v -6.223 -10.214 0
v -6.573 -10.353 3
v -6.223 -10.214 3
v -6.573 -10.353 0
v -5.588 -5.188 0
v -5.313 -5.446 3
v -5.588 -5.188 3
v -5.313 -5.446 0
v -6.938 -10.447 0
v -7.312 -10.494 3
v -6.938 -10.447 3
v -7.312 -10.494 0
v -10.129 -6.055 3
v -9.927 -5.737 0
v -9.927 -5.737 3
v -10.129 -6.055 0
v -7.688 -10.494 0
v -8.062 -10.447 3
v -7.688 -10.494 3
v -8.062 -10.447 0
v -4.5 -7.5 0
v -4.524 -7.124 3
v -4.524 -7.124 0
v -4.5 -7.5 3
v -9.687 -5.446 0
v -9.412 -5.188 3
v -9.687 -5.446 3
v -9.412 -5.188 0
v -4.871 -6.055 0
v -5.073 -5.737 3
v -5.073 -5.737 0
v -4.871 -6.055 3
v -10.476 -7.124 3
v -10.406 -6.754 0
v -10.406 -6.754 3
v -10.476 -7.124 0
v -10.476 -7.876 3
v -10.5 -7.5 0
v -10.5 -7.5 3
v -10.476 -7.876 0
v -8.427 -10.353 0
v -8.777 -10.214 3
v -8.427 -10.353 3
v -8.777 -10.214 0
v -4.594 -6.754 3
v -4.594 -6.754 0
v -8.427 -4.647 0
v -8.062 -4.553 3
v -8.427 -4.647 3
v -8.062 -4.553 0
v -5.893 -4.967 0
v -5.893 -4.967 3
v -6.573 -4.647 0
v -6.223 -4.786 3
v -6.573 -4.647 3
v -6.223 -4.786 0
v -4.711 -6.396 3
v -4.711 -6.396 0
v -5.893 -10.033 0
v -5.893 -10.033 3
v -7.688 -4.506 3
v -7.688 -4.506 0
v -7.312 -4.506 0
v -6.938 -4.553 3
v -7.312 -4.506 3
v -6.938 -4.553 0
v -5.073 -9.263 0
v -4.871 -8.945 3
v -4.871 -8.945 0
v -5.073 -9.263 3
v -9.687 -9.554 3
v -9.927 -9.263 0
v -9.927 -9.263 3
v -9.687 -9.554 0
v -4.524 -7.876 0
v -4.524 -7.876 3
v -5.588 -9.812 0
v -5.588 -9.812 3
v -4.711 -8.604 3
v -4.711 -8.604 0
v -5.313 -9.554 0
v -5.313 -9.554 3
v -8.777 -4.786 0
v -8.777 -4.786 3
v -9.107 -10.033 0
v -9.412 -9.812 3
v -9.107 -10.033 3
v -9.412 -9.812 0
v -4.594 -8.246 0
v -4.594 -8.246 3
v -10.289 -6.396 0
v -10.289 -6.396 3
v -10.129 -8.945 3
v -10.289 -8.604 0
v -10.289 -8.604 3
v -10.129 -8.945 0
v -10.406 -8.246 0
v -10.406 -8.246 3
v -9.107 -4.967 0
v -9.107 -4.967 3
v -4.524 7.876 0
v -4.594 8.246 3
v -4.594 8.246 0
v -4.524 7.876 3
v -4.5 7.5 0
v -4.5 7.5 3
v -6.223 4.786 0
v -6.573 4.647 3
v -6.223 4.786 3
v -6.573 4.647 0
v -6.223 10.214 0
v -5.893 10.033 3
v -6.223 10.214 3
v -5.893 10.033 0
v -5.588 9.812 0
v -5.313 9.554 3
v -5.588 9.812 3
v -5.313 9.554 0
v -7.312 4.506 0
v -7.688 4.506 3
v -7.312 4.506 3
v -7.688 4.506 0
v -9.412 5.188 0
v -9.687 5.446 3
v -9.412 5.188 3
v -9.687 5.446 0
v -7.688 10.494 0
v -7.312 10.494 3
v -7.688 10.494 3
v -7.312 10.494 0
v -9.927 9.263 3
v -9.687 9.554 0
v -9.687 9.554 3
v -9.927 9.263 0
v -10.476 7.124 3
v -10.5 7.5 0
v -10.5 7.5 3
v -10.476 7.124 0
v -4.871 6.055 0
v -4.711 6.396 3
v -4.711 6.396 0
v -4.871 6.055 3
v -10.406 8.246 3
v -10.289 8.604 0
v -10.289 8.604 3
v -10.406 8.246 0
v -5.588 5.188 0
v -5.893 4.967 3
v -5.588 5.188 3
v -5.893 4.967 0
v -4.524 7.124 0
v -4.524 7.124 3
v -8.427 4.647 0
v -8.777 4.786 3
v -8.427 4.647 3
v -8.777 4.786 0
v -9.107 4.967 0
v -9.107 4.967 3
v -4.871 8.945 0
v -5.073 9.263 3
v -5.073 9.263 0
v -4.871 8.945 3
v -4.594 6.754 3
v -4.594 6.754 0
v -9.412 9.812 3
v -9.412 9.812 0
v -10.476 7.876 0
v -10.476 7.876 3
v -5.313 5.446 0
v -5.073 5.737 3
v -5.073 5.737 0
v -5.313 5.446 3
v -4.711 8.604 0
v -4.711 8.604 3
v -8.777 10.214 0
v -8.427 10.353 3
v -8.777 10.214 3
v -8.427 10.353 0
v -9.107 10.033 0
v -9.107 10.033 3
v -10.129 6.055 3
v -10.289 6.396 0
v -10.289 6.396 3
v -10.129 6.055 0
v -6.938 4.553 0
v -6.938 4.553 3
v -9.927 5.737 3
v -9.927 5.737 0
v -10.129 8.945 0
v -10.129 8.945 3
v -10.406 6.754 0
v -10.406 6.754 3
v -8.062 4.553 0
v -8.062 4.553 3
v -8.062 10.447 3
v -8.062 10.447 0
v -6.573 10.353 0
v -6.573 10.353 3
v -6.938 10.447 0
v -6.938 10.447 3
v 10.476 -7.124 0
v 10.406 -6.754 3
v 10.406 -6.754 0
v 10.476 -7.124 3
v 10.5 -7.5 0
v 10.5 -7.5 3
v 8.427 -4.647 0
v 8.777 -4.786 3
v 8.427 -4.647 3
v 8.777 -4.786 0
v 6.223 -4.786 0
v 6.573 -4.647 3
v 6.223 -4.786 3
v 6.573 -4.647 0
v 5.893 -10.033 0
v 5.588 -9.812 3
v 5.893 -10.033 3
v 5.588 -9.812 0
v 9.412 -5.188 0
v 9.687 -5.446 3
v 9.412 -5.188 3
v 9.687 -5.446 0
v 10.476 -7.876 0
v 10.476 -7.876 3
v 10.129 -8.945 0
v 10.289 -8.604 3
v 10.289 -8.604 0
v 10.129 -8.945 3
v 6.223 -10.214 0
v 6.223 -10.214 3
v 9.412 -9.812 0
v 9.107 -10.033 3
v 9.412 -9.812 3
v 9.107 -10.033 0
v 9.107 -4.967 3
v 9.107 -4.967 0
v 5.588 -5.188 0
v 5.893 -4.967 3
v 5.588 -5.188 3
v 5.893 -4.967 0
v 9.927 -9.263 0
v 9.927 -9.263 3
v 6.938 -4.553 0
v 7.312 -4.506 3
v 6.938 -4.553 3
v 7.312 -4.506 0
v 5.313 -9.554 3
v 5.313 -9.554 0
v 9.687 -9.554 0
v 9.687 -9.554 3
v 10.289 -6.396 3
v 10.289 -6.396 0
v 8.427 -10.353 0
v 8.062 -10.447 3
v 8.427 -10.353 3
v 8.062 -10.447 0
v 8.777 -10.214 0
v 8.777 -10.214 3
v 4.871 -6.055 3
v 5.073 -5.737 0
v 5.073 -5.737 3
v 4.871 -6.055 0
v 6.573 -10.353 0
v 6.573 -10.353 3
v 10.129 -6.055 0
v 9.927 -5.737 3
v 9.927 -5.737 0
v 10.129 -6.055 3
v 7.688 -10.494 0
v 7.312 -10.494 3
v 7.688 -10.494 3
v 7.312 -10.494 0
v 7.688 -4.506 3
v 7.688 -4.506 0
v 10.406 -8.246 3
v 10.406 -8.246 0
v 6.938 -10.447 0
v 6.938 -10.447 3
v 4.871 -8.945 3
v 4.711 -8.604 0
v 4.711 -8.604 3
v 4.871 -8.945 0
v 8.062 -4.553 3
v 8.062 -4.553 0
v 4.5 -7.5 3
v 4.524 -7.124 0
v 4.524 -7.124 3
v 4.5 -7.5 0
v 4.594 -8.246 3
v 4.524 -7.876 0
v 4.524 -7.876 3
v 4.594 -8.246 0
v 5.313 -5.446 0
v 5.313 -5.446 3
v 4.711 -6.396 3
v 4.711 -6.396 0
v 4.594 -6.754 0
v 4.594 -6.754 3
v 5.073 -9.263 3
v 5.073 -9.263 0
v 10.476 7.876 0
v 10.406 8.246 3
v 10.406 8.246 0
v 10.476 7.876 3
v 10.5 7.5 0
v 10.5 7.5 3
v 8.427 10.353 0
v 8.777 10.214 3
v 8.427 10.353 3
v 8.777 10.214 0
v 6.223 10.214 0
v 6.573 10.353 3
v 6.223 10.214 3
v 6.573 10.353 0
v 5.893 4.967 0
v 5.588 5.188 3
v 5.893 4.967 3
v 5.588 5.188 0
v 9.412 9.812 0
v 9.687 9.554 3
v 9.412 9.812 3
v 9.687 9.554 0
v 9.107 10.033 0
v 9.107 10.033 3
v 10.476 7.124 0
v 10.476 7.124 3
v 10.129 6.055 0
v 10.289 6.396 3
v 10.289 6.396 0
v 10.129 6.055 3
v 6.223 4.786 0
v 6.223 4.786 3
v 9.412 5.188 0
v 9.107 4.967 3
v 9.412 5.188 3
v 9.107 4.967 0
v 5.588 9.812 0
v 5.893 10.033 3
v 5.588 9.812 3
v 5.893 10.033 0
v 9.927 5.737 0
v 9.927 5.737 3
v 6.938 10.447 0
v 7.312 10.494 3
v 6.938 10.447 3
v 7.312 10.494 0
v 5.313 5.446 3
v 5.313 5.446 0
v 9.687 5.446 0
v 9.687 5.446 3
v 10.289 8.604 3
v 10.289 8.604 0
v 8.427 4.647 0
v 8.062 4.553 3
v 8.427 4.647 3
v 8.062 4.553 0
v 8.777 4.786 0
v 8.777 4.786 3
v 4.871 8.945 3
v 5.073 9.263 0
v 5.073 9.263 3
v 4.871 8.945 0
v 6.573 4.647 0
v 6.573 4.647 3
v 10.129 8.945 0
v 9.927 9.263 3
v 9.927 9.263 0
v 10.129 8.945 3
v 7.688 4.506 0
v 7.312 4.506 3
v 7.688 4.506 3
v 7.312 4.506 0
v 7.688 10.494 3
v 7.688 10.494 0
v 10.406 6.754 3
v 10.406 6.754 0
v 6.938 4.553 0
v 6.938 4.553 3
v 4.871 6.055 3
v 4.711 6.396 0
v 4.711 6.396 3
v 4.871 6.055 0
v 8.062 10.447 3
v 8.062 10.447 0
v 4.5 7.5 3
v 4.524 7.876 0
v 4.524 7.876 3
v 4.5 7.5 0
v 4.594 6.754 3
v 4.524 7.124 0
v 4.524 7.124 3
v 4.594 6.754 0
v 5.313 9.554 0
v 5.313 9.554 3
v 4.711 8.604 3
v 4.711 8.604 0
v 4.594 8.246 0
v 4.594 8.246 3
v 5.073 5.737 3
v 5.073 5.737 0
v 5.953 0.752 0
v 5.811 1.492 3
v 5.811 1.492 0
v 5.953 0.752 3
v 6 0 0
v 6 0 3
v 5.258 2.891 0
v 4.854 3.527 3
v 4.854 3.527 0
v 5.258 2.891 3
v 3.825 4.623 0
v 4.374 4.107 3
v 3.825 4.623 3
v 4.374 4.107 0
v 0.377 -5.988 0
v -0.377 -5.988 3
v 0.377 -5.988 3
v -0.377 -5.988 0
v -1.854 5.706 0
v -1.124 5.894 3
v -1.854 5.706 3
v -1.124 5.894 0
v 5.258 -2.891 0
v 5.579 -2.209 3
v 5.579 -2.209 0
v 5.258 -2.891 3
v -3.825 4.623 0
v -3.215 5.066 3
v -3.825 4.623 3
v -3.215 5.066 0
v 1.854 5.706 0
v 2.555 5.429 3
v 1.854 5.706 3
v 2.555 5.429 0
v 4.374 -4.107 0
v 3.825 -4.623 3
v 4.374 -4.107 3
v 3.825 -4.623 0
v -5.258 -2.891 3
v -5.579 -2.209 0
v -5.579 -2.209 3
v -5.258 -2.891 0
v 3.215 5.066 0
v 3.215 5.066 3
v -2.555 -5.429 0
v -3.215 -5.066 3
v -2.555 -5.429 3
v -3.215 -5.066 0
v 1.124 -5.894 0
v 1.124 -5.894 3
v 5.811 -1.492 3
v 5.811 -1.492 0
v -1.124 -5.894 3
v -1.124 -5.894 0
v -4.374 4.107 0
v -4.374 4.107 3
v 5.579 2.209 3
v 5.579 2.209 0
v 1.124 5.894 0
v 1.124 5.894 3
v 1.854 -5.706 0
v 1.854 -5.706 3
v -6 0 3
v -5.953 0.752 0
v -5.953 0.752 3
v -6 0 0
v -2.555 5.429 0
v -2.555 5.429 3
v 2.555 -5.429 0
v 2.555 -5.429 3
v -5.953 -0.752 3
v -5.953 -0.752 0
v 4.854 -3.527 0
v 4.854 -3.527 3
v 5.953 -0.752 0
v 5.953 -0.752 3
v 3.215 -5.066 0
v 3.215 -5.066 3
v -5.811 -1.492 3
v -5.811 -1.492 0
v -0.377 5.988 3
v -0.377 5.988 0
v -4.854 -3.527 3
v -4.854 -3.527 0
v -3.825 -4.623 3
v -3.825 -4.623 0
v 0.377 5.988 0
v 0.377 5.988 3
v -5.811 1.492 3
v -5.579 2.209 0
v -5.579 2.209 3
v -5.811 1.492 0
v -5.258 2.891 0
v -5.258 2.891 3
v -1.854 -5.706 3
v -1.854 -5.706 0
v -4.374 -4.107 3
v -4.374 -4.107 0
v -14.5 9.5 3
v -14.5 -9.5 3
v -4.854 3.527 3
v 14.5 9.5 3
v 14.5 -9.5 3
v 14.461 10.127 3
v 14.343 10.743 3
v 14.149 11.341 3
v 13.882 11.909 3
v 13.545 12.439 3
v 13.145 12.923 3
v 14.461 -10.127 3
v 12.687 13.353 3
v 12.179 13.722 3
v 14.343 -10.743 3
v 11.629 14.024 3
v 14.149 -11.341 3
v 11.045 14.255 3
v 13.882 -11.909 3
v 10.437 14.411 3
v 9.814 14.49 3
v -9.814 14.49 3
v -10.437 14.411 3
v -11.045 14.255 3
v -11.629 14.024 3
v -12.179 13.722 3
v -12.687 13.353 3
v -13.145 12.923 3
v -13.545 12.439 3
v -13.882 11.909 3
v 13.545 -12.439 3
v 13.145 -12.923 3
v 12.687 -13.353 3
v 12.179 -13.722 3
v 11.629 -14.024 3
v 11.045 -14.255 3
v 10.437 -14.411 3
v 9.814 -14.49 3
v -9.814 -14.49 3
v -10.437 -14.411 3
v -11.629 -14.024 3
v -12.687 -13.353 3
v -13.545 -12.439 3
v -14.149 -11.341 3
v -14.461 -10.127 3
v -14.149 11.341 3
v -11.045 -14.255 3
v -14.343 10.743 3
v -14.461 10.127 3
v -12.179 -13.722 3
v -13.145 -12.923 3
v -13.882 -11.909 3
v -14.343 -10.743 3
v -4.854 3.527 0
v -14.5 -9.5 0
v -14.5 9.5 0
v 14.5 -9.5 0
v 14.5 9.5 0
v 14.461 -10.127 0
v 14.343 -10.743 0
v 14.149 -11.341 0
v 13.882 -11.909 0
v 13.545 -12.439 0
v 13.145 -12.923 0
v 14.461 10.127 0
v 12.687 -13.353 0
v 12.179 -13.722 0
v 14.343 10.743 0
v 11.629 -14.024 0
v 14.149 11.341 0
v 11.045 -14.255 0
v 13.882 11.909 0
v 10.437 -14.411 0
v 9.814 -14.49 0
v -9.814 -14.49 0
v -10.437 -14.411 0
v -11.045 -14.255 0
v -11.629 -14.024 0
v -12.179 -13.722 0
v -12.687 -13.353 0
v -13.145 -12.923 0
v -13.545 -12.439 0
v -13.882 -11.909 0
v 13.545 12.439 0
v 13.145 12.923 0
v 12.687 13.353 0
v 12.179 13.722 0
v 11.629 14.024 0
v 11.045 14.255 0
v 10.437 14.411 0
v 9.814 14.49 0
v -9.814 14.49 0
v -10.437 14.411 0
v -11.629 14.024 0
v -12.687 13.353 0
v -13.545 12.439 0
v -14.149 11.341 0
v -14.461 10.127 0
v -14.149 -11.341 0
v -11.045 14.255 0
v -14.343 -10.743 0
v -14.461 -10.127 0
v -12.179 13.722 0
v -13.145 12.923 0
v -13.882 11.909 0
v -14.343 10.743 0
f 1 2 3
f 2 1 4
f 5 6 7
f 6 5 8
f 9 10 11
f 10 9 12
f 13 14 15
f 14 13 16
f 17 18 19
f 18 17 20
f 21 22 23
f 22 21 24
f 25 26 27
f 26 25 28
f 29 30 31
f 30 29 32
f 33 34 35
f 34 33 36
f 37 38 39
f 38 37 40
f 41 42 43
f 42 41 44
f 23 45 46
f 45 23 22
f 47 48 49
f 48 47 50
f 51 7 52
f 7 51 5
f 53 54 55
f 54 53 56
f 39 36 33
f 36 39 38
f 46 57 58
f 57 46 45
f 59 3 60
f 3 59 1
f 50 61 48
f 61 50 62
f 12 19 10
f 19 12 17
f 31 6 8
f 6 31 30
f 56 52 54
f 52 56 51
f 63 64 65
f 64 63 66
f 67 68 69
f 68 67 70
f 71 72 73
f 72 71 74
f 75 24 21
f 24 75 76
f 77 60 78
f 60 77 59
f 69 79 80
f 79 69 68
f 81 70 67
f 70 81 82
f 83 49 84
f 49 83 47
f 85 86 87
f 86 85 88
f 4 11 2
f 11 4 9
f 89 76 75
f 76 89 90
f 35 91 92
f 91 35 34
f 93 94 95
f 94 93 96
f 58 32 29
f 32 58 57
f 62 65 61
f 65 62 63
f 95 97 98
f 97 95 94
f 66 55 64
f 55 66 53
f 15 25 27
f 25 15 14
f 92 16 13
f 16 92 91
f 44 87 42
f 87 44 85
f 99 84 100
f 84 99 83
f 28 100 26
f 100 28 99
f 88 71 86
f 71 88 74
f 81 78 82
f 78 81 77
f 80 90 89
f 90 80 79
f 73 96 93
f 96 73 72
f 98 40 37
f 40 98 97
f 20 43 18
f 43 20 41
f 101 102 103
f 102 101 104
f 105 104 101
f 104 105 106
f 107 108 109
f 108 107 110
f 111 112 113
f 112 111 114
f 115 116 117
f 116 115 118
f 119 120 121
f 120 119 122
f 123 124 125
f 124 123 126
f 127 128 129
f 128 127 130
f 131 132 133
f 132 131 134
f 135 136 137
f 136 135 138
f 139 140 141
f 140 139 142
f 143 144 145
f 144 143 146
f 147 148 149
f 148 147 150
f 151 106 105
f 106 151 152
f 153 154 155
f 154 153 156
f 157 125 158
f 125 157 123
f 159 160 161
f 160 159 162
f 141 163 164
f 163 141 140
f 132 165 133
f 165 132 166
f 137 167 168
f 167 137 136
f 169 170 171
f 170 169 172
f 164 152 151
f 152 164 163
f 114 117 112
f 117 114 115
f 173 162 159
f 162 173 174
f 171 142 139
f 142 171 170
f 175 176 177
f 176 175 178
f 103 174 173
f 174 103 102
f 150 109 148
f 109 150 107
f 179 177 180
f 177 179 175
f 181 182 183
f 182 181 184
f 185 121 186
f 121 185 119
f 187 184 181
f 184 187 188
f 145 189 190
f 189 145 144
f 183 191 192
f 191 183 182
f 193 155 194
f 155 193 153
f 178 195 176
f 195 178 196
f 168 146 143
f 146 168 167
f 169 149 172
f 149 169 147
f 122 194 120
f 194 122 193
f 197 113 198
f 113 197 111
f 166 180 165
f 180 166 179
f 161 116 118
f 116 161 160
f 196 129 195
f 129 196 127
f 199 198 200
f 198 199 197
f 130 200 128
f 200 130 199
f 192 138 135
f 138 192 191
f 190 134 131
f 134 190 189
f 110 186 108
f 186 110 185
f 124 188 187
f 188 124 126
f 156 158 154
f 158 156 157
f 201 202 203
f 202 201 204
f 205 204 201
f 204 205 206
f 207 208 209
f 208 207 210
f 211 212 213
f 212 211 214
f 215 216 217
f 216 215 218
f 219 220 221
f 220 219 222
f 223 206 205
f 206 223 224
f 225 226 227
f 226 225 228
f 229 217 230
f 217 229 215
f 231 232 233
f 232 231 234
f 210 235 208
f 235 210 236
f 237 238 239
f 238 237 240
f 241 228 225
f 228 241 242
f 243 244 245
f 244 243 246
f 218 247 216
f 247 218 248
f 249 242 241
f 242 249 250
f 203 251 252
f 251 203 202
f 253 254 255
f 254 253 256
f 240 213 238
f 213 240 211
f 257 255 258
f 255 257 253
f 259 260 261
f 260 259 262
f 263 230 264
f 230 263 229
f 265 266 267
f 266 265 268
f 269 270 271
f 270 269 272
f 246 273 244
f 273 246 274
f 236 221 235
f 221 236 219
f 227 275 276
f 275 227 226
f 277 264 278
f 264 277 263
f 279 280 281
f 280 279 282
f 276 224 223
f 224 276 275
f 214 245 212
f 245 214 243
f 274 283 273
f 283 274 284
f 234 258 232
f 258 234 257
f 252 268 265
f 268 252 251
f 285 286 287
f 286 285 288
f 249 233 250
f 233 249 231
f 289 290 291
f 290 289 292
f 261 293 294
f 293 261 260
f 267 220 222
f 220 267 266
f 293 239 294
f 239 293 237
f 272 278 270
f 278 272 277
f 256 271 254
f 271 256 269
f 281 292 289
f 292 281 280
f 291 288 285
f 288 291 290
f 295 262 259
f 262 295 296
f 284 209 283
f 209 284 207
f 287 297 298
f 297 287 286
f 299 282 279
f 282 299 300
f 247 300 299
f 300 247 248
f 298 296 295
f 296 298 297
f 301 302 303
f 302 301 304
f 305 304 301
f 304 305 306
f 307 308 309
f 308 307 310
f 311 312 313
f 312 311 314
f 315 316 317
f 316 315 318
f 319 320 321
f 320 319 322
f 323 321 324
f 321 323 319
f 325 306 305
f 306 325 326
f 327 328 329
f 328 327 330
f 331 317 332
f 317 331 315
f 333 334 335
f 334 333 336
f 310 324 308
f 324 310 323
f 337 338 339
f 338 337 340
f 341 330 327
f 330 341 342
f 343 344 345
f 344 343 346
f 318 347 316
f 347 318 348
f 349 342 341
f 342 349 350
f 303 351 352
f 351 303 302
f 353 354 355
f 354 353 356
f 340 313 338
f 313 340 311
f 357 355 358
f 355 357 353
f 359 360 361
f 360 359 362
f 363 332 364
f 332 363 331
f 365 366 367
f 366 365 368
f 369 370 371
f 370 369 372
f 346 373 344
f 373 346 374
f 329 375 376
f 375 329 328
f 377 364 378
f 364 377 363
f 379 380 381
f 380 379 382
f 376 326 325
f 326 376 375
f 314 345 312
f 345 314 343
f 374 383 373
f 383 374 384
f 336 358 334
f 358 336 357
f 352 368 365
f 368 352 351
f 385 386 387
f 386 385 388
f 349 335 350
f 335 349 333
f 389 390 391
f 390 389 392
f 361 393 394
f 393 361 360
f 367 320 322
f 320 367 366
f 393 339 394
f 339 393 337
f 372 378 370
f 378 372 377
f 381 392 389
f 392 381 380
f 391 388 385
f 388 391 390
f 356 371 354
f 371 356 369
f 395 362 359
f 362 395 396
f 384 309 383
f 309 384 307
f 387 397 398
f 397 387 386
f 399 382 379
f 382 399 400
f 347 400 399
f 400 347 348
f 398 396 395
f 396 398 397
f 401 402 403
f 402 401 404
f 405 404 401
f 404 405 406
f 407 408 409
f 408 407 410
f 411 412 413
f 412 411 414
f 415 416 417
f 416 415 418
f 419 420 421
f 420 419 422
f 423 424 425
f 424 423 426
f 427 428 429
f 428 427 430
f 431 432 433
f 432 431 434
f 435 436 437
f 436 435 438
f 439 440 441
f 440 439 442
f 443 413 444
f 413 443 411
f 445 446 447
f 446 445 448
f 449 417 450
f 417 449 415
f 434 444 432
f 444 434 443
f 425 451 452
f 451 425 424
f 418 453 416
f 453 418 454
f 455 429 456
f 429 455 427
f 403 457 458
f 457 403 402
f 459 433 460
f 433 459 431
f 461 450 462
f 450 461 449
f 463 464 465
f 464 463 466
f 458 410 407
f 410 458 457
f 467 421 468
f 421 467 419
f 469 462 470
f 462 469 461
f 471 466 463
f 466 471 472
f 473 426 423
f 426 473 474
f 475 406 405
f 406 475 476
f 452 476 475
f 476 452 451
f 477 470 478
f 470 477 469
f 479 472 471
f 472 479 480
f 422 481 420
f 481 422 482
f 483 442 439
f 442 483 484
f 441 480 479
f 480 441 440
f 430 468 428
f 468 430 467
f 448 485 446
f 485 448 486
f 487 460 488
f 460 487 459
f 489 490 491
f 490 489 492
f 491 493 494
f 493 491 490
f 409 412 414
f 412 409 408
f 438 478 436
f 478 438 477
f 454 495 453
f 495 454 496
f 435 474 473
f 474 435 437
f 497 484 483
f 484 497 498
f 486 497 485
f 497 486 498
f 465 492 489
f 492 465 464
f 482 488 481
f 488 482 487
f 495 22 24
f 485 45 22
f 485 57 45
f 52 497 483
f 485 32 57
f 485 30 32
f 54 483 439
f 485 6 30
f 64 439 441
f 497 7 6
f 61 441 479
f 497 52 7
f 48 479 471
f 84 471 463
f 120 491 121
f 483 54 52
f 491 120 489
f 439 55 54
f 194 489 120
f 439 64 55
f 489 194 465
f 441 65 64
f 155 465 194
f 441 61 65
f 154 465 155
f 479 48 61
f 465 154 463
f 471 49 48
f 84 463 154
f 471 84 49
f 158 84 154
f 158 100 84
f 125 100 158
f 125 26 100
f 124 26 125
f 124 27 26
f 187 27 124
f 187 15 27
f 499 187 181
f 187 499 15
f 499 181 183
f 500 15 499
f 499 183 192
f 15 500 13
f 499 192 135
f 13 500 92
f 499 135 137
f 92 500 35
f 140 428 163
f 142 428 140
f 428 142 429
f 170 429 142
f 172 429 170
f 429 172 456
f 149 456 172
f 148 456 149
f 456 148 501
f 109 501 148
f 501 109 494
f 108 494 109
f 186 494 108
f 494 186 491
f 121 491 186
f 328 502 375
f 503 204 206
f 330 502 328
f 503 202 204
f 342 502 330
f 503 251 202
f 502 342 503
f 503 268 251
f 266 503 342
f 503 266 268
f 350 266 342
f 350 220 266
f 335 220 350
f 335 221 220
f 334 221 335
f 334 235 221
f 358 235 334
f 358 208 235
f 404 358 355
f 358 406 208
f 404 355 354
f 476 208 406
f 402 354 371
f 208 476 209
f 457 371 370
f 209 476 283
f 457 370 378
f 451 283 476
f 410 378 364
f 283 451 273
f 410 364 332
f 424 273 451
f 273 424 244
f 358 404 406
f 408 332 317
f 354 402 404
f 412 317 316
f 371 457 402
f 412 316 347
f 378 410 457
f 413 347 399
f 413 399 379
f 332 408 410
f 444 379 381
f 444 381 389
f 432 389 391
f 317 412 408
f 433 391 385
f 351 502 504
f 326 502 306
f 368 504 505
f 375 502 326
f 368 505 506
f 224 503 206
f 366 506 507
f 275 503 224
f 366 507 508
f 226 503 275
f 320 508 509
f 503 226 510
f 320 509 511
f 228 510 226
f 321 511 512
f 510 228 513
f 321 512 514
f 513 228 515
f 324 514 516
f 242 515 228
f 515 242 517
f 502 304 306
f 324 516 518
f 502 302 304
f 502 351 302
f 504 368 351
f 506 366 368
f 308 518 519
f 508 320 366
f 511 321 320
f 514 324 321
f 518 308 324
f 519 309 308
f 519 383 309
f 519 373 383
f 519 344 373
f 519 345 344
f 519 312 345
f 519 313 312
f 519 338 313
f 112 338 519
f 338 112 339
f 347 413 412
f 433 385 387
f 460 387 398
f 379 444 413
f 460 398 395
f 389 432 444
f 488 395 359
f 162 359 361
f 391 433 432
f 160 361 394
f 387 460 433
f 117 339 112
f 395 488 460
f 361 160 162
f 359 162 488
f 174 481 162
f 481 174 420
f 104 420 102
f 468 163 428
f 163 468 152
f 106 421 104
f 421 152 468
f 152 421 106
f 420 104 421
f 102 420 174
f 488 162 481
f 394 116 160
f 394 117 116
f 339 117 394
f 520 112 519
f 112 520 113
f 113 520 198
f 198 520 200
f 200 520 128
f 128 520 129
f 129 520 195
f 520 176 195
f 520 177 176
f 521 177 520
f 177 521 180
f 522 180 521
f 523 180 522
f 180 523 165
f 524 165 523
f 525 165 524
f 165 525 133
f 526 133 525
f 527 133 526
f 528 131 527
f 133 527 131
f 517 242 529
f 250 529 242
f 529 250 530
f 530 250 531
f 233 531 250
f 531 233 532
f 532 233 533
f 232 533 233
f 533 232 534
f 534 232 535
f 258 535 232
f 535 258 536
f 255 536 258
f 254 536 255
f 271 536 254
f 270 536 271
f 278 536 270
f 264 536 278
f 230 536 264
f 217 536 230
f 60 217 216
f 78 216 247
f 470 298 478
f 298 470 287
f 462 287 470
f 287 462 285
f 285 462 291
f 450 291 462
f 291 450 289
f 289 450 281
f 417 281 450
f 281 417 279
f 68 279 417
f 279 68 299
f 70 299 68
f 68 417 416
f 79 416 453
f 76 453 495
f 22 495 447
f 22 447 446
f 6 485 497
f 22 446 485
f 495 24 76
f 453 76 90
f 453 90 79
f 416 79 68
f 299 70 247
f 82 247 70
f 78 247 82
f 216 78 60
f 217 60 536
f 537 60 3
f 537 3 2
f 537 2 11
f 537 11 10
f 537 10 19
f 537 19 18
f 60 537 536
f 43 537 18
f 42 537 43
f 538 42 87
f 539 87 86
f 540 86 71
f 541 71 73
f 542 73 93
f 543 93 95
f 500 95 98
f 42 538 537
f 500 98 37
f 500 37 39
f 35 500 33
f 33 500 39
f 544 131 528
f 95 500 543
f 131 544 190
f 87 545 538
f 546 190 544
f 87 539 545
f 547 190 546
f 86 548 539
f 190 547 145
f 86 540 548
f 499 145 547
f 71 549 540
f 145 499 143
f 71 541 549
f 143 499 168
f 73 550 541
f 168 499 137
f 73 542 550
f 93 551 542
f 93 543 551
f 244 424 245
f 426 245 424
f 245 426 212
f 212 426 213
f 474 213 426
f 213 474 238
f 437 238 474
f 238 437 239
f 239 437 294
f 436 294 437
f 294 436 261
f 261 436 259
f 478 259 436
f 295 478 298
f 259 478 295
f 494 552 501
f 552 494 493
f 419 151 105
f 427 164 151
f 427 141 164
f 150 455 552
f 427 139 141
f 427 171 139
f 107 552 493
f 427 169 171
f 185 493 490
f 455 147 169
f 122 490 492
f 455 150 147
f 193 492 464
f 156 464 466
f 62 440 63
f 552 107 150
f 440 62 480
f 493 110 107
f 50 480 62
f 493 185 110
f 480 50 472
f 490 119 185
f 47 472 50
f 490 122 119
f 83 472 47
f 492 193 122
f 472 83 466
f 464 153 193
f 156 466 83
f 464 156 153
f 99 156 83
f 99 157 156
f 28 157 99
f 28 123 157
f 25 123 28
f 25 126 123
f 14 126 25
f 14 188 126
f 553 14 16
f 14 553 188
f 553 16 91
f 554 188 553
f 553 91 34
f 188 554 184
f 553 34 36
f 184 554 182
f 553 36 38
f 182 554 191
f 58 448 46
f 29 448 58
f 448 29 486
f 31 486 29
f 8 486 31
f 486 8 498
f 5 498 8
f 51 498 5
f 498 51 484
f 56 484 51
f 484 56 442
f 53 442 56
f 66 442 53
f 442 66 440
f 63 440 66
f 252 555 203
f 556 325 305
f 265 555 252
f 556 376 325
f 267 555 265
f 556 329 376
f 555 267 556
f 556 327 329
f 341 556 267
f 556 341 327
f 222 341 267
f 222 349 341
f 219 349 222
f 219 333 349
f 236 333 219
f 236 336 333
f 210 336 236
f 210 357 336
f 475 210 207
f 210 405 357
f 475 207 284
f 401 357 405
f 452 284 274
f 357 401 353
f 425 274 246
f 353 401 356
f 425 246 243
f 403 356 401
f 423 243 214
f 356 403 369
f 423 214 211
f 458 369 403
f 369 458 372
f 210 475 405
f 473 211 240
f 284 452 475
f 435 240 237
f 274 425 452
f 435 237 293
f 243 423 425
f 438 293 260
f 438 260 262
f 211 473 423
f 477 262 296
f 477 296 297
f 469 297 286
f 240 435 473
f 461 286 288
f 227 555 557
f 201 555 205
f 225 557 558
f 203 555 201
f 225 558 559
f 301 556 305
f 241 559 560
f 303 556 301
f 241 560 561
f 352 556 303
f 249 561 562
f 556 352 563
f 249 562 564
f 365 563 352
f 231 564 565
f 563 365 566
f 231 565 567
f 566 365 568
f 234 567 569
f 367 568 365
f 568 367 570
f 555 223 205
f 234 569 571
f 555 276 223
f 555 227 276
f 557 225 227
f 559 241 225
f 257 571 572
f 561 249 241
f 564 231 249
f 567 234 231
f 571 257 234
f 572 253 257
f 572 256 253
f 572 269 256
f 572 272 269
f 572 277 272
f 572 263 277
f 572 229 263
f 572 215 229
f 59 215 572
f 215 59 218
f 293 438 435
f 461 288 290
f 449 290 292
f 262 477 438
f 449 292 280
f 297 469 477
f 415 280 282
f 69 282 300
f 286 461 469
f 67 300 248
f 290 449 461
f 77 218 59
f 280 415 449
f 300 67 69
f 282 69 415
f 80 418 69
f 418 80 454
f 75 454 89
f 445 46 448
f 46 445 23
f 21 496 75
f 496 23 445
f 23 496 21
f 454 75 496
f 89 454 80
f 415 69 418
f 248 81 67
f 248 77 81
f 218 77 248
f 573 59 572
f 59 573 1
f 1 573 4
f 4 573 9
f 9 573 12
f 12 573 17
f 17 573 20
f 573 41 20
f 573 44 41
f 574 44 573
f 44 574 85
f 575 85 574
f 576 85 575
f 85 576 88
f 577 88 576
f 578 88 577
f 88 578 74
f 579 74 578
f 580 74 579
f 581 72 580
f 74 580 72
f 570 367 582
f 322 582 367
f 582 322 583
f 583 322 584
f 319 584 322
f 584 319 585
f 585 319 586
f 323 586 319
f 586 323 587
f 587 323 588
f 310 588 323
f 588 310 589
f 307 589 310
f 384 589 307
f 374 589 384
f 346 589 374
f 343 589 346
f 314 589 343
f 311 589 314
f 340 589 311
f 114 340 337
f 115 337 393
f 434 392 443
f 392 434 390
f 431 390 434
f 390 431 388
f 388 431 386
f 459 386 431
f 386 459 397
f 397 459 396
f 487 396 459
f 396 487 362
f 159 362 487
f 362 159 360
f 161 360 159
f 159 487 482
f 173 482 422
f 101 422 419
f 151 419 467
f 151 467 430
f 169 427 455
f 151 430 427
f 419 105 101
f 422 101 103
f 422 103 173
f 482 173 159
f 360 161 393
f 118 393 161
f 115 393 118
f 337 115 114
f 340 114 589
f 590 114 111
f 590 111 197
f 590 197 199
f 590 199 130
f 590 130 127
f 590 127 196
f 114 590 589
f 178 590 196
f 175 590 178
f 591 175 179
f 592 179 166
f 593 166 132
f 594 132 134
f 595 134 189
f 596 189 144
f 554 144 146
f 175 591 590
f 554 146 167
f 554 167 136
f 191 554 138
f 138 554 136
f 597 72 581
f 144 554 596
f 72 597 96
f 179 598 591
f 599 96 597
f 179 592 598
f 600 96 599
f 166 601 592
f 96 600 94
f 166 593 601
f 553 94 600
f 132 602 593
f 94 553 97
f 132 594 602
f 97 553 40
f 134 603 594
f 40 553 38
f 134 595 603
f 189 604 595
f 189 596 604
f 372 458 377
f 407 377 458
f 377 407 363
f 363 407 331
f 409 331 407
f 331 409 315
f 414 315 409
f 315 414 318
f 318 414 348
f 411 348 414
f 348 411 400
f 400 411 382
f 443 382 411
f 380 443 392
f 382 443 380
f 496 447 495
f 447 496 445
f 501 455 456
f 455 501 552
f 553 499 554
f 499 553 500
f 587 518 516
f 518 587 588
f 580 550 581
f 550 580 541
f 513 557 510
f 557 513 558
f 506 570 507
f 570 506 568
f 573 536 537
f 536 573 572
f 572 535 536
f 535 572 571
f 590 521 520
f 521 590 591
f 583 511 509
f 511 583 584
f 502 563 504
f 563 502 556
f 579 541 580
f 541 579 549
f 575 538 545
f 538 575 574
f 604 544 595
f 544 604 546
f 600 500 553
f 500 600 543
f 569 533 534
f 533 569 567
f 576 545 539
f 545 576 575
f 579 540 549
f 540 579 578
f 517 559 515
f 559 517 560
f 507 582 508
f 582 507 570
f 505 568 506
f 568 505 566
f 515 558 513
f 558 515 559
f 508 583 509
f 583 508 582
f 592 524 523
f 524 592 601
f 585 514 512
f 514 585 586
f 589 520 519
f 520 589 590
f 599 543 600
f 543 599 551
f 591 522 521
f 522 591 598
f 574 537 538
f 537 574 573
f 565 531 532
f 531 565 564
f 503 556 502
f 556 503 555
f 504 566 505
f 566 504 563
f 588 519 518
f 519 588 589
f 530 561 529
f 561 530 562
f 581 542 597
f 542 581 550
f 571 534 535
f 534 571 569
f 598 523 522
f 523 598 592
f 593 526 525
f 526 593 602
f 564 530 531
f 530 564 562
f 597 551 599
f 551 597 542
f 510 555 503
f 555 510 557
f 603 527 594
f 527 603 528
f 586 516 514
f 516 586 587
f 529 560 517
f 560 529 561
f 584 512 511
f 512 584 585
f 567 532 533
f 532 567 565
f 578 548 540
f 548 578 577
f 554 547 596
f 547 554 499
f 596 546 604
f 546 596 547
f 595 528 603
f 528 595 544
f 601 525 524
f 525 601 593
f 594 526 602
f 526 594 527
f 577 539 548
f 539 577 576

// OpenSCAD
$fn = 50;


difference() {
	union() {
		hull() {
			translate(v = [-9.5000000000, 9.5000000000, 0]) {
				cylinder(h = 3, r = 5);
			}
			translate(v = [9.5000000000, 9.5000000000, 0]) {
				cylinder(h = 3, r = 5);
			}
			translate(v = [-9.5000000000, -9.5000000000, 0]) {
				cylinder(h = 3, r = 5);
			}
			translate(v = [9.5000000000, -9.5000000000, 0]) {
				cylinder(h = 3, r = 5);
			}
		}
	}
	union() {
		#translate(v = [-7.5000000000, -7.5000000000, -100.0000000000]) {
			cylinder(h = 200, r = 3.0000000000);
		}
		#translate(v = [-7.5000000000, 7.5000000000, -100.0000000000]) {
			cylinder(h = 200, r = 3.0000000000);
		}
		#translate(v = [7.5000000000, -7.5000000000, -100.0000000000]) {
			cylinder(h = 200, r = 3.0000000000);
		}
		#translate(v = [7.5000000000, 7.5000000000, -100.0000000000]) {
			cylinder(h = 200, r = 3.0000000000);
		}
		#cylinder(h = 3, r = 6.0000000000);
	}
}
